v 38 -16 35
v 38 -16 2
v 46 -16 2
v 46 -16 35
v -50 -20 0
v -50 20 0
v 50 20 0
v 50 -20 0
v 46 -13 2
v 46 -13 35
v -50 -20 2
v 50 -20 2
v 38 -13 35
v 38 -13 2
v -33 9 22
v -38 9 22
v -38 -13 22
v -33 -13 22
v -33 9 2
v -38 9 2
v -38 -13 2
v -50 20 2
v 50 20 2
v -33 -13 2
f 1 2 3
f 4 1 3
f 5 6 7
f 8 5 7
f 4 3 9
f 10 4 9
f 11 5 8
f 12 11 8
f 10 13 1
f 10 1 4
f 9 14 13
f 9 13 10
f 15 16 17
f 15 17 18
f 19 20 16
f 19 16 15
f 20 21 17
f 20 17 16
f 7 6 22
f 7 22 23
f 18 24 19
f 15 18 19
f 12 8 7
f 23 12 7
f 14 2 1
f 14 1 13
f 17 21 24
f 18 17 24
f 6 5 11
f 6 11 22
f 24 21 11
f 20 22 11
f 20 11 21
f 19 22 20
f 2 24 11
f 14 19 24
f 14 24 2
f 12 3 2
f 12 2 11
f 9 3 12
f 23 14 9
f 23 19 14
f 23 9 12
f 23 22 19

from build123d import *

# Parameters (mm, degrees)
ESQUISSE1_W        = 100
ESQUISSE1_H        = 40
BOSS_EXTRU_1_DEPTH = 2
ESQUISSE3_W        = 5
ESQUISSE3_H        = 22
BOSS_EXTRU_2_DEPTH = 20
ESQUISSE4_W        = 8
ESQUISSE4_H        = 3
BOSS_EXTRU_3_DEPTH = 35


with BuildPart() as part:
    # Esquisse1 → Boss.-Extru.1 (new body)
    with BuildSketch(Plane.XY):
        Rectangle(ESQUISSE1_W, ESQUISSE1_H)
    extrude(amount=BOSS_EXTRU_1_DEPTH)

    # Esquisse3 → Boss.-Extru.2 (add)
    with BuildSketch(Plane.XY.offset(2)):
        with Locations((-35.5, -2)):
            Rectangle(ESQUISSE3_W, ESQUISSE3_H)
    extrude(amount=BOSS_EXTRU_2_DEPTH)

    # Esquisse4 → Boss.-Extru.3 (add)
    with BuildSketch(Plane.XY):
        with Locations((42, -14.5)):
            Rectangle(ESQUISSE4_W, ESQUISSE4_H)
    extrude(amount=BOSS_EXTRU_3_DEPTH)


solid = part.part
